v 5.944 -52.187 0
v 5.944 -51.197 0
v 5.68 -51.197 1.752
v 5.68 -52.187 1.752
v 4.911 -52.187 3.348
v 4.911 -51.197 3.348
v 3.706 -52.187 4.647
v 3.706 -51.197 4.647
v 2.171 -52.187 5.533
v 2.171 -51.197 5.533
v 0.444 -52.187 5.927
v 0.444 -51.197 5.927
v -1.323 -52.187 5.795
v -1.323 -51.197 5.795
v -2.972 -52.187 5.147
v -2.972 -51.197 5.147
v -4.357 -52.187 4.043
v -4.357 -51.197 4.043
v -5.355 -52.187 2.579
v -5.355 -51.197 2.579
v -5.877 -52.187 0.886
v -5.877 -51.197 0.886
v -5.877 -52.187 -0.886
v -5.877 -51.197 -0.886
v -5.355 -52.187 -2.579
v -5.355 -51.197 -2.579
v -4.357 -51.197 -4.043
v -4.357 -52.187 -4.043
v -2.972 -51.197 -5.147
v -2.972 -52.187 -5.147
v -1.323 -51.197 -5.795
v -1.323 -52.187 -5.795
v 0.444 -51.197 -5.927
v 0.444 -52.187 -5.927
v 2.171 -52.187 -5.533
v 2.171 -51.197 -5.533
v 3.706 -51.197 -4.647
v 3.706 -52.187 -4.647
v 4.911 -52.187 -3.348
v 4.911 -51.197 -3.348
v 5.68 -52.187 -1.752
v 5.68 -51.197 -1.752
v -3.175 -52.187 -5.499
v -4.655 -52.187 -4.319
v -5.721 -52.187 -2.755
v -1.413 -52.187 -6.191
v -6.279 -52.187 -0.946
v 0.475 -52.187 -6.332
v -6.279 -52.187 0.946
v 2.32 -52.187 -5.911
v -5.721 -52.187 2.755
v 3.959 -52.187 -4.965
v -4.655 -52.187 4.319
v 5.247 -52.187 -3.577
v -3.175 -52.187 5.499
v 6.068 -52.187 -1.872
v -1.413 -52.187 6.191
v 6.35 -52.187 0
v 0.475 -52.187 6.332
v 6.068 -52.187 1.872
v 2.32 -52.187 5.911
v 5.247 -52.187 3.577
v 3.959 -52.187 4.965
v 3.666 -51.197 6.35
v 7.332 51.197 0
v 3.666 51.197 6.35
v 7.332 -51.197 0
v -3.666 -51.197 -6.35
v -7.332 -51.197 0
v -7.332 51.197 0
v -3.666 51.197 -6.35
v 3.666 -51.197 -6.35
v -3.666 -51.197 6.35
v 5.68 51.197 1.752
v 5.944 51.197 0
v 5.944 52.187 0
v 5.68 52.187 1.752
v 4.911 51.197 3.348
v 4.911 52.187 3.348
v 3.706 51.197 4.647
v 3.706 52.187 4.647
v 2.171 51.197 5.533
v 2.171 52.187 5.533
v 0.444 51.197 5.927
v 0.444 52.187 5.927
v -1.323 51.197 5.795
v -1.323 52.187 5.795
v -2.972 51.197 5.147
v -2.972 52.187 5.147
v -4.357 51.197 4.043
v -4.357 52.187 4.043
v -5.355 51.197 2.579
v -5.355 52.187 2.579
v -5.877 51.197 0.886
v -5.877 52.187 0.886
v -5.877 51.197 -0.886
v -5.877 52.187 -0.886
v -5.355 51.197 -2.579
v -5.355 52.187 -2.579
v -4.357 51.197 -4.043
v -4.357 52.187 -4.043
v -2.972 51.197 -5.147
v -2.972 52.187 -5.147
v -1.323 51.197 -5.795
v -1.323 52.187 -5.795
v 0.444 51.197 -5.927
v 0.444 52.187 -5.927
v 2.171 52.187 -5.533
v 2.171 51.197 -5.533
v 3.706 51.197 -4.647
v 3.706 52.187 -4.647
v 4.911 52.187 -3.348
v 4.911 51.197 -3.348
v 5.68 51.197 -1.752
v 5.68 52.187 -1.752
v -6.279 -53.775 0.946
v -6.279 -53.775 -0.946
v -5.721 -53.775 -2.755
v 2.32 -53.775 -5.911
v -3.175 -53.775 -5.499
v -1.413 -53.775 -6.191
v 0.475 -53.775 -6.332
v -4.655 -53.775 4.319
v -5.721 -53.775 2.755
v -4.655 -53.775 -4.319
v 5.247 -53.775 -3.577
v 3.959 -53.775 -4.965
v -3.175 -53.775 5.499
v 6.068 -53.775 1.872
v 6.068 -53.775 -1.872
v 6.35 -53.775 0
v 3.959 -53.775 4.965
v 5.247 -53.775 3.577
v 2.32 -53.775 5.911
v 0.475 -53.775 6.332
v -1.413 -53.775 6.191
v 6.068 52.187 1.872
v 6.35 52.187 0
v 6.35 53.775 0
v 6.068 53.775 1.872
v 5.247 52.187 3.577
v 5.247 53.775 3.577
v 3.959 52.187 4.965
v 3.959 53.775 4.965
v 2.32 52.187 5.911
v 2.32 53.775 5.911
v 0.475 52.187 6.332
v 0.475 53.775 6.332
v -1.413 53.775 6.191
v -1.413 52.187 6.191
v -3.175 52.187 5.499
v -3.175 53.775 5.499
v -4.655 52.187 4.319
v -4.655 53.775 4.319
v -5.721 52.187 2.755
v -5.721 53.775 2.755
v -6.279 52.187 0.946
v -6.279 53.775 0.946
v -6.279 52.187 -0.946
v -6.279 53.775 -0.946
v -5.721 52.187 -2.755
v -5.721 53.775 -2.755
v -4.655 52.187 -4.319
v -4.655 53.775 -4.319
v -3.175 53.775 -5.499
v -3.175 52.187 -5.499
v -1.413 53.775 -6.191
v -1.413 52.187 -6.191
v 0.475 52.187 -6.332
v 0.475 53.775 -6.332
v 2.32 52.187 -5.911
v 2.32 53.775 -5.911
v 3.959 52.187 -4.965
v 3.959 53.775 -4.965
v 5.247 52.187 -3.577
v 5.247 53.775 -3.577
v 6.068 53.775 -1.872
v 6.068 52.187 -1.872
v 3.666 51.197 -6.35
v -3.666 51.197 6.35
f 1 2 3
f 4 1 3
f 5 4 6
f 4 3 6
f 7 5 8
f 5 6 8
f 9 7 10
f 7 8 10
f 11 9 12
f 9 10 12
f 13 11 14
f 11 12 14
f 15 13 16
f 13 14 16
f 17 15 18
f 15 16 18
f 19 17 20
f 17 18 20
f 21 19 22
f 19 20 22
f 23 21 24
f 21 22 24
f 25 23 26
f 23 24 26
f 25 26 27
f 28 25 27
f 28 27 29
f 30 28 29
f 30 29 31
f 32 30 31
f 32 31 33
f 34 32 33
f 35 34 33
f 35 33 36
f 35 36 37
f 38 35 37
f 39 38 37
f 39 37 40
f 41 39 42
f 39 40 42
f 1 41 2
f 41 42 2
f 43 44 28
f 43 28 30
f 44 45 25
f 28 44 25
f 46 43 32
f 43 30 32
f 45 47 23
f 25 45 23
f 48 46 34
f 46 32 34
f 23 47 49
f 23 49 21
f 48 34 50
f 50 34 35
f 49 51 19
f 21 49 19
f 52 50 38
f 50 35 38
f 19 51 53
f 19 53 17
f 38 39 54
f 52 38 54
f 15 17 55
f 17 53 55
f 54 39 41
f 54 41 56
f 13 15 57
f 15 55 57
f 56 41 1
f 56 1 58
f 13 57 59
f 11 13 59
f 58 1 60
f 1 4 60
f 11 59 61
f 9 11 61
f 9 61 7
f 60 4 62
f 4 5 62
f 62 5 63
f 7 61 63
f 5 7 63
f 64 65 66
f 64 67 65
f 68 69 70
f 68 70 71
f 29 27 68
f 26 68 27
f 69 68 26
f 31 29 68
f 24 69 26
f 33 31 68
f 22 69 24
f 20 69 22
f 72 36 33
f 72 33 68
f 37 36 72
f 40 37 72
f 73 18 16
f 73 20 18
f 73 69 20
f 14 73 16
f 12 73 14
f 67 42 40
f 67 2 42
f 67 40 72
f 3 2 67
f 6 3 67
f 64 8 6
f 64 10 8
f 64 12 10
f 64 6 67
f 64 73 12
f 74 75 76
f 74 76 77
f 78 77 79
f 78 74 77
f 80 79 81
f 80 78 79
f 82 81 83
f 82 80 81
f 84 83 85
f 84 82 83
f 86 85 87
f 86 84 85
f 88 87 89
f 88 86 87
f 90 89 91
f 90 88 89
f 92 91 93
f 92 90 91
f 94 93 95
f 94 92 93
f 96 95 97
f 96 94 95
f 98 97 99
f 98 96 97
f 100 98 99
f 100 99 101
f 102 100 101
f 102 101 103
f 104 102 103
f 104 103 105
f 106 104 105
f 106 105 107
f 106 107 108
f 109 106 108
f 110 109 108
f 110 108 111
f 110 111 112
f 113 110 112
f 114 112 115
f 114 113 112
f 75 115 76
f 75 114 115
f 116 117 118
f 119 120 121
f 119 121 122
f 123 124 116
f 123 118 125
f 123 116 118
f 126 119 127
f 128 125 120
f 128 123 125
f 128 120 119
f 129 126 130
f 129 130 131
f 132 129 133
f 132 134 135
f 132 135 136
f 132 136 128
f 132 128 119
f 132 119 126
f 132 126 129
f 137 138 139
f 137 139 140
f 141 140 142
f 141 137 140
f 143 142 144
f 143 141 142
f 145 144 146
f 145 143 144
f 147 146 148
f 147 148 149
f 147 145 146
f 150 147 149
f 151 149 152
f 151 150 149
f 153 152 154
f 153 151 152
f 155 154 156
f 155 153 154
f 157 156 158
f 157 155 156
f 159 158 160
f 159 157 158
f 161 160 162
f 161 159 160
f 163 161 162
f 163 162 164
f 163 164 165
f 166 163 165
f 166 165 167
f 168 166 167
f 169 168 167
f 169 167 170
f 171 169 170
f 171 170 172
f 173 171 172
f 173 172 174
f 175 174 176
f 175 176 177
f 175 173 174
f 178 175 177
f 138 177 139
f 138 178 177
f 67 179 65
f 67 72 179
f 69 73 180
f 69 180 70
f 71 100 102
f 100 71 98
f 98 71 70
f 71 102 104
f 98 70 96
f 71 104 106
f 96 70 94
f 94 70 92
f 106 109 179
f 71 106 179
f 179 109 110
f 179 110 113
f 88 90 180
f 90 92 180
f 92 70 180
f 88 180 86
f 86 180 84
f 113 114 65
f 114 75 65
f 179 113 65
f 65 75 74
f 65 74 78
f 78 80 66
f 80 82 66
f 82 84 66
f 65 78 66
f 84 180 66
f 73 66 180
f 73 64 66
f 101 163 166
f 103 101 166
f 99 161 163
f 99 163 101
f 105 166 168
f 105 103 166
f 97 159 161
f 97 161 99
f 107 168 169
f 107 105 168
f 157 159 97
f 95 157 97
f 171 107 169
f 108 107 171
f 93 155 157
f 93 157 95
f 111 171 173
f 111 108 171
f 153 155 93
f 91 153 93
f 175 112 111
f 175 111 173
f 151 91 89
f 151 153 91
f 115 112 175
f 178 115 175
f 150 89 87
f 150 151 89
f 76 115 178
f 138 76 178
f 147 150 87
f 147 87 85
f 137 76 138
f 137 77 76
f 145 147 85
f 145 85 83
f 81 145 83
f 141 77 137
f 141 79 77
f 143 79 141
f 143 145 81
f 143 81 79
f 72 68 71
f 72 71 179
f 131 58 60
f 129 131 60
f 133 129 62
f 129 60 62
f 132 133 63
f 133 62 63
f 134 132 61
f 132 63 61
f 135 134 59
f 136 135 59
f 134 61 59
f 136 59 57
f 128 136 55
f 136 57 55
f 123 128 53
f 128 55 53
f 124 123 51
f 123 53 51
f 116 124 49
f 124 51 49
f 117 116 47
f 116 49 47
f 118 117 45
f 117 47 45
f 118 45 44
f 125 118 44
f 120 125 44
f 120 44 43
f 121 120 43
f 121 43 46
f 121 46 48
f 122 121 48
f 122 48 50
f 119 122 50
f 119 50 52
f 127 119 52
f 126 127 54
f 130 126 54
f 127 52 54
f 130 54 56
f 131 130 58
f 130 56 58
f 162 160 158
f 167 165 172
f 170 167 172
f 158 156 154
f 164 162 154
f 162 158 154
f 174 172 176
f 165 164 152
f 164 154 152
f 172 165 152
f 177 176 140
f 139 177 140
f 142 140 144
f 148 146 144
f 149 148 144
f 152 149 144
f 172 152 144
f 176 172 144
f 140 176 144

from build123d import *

# Parameters (mm, degrees)
F1_DEPTH      = 51.196875
F1_DEPTH_BACK = 51.196875
F2_R          = 5.9436
F3_DEPTH      = 0.9906
F4_R          = 6.35
F5_DEPTH      = 1.5875


# Not quite as in the source:
# - a pattern or mirror of a feature is missing from the dataset's text; its kind, count and spacing are read off the source's solid


with BuildPart() as f1:
    # F0 (on Front) → F1 (new body, two sides)
    with BuildSketch(Plane.XZ) as f1_sk:
        Polygon((3.6661742094, 6.35), (-3.6661742094, 6.35), (-7.3323484187, 0), (-3.6661742094, -6.35), (3.6661742094, -6.35), (7.3323484187, 0), align=None)
    extrude(amount=F1_DEPTH)
    extrude(f1_sk.sketch, amount=-F1_DEPTH_BACK)

    # F2 (on face) → F3 (join)
    with BuildSketch(Plane.XZ.offset(51.196875)):
        Circle(F2_R)
    f3 = extrude(amount=F3_DEPTH)

    # F3_copies: F3 across plane
    add(f3.mirror(Plane.ZX))

    # F4 (on face) → F5 (join)
    with BuildSketch(Plane.XZ.offset(52.187475)):
        Circle(F4_R)
    f5 = extrude(amount=F5_DEPTH)

    # F5_copies: F5 across plane
    add(f5.mirror(Plane.ZX))


solid = f1.part
